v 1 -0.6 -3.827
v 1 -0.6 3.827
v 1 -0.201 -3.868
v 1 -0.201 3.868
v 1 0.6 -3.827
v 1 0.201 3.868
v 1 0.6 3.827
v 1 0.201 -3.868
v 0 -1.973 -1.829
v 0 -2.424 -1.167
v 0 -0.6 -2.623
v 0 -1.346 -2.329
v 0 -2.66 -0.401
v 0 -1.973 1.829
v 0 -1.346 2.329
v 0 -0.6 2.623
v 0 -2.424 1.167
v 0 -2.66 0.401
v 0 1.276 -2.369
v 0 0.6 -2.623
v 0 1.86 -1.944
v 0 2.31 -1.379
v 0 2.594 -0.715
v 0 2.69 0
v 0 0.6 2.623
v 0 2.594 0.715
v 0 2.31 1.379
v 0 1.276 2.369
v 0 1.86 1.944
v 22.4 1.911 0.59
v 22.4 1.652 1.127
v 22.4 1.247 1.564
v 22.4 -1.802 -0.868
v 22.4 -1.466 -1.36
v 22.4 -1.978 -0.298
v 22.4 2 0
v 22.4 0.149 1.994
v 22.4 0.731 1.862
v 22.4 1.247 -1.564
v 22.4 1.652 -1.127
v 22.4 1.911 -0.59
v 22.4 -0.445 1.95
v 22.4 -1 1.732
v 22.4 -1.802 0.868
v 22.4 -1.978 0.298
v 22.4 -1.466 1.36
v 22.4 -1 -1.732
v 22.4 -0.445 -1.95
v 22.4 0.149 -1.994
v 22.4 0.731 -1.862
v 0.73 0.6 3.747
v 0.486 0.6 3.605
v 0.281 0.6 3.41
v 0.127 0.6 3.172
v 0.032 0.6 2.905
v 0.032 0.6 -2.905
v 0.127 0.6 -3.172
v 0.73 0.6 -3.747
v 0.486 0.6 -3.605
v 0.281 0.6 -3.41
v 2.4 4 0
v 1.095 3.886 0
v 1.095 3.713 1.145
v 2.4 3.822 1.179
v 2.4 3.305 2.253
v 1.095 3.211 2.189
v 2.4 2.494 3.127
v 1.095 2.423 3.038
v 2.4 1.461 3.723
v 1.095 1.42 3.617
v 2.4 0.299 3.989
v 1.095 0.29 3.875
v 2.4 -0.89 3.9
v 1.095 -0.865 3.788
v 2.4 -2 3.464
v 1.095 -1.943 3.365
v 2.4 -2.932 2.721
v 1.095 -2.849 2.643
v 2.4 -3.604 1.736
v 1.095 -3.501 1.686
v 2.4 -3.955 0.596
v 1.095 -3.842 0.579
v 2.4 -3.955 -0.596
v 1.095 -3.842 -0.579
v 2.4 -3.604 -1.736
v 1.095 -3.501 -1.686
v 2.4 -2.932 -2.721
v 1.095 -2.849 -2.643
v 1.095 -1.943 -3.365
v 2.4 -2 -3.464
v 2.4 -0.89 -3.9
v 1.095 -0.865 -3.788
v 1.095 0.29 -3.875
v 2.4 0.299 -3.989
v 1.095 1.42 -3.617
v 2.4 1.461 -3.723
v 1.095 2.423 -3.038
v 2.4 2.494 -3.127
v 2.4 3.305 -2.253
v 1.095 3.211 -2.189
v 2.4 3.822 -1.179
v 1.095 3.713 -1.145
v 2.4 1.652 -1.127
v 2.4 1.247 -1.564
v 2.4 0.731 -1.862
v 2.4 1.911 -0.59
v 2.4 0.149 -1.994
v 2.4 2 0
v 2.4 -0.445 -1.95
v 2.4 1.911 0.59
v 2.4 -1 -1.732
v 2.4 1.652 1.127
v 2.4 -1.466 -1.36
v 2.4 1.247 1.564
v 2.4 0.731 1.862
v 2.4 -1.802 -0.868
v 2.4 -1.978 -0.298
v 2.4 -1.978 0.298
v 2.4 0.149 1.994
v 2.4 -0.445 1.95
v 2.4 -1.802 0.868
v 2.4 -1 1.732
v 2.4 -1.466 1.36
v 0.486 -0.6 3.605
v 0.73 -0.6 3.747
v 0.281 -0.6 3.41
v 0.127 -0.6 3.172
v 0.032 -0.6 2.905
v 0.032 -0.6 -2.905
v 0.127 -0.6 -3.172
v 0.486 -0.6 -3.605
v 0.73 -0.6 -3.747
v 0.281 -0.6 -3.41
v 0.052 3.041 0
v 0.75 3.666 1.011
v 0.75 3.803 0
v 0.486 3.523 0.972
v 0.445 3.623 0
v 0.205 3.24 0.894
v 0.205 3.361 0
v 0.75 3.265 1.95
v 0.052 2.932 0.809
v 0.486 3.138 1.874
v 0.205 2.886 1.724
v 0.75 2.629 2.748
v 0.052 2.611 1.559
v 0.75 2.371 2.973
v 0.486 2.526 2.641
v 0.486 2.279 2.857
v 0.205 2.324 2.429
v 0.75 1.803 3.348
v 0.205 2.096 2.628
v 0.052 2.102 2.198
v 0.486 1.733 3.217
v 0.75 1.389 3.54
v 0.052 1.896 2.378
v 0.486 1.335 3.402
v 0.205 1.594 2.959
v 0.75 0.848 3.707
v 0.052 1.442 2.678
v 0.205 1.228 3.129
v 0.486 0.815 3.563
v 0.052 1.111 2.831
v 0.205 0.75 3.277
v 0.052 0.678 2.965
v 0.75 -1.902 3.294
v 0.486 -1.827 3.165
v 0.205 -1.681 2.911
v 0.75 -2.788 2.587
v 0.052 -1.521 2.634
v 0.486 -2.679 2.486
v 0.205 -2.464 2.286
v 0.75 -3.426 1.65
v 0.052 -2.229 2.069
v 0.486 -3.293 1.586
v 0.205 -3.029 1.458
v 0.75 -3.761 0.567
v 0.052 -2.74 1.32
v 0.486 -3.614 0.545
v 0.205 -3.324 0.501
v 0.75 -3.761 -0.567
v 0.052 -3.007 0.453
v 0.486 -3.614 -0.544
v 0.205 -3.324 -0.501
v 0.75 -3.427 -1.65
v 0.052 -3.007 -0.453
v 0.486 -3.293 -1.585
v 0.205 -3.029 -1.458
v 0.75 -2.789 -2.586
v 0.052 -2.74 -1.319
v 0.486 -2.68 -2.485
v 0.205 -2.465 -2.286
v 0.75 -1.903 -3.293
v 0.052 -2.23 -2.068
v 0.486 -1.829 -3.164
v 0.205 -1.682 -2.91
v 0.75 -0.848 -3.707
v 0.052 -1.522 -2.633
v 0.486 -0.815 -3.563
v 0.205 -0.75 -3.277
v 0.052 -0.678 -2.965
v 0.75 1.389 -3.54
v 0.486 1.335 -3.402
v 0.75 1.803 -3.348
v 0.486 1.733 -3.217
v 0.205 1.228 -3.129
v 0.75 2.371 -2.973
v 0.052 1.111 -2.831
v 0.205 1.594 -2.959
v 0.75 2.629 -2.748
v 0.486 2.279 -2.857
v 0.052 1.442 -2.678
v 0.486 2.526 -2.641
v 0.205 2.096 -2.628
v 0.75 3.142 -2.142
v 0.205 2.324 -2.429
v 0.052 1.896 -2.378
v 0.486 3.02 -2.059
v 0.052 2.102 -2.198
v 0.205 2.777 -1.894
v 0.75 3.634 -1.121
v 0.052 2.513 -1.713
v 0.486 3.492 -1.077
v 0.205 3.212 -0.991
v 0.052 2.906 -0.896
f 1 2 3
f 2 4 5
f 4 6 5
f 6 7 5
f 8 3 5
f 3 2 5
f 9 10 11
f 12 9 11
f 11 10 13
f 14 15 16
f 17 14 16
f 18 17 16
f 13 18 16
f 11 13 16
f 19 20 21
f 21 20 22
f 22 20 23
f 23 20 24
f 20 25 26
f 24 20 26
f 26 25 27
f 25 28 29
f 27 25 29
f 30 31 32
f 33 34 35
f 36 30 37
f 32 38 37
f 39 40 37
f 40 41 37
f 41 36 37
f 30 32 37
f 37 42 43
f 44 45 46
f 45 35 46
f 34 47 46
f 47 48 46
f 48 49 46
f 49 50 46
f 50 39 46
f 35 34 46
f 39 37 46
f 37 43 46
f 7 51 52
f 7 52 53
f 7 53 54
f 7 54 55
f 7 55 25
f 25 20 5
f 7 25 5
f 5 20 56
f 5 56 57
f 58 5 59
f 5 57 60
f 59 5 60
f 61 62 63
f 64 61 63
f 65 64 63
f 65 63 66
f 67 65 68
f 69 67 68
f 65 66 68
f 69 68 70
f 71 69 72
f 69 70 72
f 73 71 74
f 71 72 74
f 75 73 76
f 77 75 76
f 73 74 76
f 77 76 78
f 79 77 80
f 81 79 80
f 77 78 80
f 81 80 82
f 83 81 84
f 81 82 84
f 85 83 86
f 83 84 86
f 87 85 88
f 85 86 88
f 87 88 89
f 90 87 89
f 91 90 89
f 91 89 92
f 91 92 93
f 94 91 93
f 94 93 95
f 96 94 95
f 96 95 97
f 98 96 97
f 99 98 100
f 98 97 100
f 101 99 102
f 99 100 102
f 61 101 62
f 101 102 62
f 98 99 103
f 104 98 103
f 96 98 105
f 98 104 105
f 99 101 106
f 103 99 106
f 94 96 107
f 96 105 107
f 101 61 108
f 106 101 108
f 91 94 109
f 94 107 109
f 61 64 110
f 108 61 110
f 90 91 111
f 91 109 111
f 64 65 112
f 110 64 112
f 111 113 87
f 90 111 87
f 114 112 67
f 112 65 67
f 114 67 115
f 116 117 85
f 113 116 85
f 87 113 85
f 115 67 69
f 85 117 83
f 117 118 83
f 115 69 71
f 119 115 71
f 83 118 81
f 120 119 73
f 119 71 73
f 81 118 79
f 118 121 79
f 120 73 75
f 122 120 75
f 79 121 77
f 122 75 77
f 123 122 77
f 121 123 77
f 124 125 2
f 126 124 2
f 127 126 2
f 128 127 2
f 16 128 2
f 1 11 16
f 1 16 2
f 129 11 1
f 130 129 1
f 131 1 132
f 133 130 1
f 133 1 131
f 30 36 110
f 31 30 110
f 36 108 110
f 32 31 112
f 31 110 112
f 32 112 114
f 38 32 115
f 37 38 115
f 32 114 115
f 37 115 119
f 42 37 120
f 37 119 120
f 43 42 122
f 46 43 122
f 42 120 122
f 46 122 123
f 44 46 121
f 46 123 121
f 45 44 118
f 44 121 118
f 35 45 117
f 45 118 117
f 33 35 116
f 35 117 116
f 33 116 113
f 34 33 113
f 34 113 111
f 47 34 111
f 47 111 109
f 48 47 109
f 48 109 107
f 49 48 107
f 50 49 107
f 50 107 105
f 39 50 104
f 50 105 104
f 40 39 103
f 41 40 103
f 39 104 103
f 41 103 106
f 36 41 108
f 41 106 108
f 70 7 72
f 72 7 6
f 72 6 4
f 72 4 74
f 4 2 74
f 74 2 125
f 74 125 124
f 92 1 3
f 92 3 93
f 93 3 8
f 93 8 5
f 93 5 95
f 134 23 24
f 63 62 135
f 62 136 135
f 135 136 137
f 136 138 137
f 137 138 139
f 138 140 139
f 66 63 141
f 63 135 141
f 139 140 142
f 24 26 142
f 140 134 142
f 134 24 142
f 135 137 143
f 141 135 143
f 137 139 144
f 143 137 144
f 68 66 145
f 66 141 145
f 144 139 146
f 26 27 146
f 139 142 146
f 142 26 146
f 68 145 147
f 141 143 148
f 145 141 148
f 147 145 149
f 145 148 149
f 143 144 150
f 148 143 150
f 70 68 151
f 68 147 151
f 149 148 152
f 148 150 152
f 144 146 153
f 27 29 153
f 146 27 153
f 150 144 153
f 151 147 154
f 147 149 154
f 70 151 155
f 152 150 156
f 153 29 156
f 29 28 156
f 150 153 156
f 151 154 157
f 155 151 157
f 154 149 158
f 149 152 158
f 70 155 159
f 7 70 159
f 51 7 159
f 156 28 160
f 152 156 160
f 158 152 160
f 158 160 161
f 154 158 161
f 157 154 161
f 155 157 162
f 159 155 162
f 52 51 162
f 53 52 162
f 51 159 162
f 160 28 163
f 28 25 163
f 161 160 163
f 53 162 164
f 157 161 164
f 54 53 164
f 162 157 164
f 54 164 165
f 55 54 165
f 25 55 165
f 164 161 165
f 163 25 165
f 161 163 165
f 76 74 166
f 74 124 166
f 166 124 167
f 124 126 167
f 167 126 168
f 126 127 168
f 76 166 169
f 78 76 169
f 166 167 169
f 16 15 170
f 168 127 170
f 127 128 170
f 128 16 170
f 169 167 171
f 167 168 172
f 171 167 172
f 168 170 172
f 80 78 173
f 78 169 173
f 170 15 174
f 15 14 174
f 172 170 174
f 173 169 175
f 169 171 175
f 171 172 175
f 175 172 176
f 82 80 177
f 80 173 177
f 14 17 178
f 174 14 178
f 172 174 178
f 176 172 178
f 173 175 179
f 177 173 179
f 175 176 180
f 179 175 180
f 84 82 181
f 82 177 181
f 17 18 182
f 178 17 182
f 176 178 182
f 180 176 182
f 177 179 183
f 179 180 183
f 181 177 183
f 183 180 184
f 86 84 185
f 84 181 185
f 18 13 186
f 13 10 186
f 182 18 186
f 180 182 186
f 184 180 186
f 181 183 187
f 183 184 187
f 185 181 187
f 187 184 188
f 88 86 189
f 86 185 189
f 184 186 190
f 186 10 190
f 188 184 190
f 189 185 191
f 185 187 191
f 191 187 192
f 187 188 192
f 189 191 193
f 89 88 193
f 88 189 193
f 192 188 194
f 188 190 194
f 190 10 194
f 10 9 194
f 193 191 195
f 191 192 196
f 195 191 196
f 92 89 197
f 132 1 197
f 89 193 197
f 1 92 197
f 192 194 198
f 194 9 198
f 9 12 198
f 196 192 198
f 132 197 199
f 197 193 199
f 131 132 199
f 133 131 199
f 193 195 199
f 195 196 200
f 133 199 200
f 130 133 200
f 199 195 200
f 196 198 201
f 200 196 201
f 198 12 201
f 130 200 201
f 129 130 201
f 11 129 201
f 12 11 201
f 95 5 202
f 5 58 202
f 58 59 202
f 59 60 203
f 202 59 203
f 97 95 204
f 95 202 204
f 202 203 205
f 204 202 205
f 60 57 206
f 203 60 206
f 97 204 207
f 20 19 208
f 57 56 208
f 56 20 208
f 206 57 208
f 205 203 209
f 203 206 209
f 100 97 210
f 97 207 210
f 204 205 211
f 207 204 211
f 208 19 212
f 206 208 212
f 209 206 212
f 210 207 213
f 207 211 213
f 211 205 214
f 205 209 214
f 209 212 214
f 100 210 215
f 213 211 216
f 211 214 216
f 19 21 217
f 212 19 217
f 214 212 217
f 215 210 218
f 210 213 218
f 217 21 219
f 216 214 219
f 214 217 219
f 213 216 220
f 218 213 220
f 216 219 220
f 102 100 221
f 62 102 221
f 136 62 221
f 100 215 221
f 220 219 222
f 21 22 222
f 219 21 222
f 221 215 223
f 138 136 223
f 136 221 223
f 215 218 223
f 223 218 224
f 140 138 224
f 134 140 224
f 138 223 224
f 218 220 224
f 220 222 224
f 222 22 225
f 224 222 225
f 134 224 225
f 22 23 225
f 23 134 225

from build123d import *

# Parameters (mm, degrees)
FILLET2_R  = 1.2
SKETCH2_W  = 8
SKETCH2_H  = 1.2
SLOT_DEPTH = 1


with BuildPart() as part:
    # BodySke → Base-Revolve (revolve)
    with BuildSketch(Plane.XY):
        Polygon((2.4, 2), (2.4, 4), (0, 3.790027208), (0, 0), (22.4, 0), (22.4, 2), align=None)
    revolve(axis=Axis((-25.4, 0, 0), (1, 0, 0)))

    # Fillet2
    fillet2_edges = [part.edges().sort_by_distance(p)[0] for p in [
        (0, -3.790027208, 0),
    ]]
    fillet(fillet2_edges, radius=FILLET2_R)

    # Sketch2 → Slot (cut)
    with BuildSketch(Plane(origin=(0, 0, 0), x_dir=(0, 0, -1), z_dir=(1, 0, 0))):
        Rectangle(SKETCH2_W, SKETCH2_H)
    extrude(amount=SLOT_DEPTH, mode=Mode.SUBTRACT)


solid = part.part
